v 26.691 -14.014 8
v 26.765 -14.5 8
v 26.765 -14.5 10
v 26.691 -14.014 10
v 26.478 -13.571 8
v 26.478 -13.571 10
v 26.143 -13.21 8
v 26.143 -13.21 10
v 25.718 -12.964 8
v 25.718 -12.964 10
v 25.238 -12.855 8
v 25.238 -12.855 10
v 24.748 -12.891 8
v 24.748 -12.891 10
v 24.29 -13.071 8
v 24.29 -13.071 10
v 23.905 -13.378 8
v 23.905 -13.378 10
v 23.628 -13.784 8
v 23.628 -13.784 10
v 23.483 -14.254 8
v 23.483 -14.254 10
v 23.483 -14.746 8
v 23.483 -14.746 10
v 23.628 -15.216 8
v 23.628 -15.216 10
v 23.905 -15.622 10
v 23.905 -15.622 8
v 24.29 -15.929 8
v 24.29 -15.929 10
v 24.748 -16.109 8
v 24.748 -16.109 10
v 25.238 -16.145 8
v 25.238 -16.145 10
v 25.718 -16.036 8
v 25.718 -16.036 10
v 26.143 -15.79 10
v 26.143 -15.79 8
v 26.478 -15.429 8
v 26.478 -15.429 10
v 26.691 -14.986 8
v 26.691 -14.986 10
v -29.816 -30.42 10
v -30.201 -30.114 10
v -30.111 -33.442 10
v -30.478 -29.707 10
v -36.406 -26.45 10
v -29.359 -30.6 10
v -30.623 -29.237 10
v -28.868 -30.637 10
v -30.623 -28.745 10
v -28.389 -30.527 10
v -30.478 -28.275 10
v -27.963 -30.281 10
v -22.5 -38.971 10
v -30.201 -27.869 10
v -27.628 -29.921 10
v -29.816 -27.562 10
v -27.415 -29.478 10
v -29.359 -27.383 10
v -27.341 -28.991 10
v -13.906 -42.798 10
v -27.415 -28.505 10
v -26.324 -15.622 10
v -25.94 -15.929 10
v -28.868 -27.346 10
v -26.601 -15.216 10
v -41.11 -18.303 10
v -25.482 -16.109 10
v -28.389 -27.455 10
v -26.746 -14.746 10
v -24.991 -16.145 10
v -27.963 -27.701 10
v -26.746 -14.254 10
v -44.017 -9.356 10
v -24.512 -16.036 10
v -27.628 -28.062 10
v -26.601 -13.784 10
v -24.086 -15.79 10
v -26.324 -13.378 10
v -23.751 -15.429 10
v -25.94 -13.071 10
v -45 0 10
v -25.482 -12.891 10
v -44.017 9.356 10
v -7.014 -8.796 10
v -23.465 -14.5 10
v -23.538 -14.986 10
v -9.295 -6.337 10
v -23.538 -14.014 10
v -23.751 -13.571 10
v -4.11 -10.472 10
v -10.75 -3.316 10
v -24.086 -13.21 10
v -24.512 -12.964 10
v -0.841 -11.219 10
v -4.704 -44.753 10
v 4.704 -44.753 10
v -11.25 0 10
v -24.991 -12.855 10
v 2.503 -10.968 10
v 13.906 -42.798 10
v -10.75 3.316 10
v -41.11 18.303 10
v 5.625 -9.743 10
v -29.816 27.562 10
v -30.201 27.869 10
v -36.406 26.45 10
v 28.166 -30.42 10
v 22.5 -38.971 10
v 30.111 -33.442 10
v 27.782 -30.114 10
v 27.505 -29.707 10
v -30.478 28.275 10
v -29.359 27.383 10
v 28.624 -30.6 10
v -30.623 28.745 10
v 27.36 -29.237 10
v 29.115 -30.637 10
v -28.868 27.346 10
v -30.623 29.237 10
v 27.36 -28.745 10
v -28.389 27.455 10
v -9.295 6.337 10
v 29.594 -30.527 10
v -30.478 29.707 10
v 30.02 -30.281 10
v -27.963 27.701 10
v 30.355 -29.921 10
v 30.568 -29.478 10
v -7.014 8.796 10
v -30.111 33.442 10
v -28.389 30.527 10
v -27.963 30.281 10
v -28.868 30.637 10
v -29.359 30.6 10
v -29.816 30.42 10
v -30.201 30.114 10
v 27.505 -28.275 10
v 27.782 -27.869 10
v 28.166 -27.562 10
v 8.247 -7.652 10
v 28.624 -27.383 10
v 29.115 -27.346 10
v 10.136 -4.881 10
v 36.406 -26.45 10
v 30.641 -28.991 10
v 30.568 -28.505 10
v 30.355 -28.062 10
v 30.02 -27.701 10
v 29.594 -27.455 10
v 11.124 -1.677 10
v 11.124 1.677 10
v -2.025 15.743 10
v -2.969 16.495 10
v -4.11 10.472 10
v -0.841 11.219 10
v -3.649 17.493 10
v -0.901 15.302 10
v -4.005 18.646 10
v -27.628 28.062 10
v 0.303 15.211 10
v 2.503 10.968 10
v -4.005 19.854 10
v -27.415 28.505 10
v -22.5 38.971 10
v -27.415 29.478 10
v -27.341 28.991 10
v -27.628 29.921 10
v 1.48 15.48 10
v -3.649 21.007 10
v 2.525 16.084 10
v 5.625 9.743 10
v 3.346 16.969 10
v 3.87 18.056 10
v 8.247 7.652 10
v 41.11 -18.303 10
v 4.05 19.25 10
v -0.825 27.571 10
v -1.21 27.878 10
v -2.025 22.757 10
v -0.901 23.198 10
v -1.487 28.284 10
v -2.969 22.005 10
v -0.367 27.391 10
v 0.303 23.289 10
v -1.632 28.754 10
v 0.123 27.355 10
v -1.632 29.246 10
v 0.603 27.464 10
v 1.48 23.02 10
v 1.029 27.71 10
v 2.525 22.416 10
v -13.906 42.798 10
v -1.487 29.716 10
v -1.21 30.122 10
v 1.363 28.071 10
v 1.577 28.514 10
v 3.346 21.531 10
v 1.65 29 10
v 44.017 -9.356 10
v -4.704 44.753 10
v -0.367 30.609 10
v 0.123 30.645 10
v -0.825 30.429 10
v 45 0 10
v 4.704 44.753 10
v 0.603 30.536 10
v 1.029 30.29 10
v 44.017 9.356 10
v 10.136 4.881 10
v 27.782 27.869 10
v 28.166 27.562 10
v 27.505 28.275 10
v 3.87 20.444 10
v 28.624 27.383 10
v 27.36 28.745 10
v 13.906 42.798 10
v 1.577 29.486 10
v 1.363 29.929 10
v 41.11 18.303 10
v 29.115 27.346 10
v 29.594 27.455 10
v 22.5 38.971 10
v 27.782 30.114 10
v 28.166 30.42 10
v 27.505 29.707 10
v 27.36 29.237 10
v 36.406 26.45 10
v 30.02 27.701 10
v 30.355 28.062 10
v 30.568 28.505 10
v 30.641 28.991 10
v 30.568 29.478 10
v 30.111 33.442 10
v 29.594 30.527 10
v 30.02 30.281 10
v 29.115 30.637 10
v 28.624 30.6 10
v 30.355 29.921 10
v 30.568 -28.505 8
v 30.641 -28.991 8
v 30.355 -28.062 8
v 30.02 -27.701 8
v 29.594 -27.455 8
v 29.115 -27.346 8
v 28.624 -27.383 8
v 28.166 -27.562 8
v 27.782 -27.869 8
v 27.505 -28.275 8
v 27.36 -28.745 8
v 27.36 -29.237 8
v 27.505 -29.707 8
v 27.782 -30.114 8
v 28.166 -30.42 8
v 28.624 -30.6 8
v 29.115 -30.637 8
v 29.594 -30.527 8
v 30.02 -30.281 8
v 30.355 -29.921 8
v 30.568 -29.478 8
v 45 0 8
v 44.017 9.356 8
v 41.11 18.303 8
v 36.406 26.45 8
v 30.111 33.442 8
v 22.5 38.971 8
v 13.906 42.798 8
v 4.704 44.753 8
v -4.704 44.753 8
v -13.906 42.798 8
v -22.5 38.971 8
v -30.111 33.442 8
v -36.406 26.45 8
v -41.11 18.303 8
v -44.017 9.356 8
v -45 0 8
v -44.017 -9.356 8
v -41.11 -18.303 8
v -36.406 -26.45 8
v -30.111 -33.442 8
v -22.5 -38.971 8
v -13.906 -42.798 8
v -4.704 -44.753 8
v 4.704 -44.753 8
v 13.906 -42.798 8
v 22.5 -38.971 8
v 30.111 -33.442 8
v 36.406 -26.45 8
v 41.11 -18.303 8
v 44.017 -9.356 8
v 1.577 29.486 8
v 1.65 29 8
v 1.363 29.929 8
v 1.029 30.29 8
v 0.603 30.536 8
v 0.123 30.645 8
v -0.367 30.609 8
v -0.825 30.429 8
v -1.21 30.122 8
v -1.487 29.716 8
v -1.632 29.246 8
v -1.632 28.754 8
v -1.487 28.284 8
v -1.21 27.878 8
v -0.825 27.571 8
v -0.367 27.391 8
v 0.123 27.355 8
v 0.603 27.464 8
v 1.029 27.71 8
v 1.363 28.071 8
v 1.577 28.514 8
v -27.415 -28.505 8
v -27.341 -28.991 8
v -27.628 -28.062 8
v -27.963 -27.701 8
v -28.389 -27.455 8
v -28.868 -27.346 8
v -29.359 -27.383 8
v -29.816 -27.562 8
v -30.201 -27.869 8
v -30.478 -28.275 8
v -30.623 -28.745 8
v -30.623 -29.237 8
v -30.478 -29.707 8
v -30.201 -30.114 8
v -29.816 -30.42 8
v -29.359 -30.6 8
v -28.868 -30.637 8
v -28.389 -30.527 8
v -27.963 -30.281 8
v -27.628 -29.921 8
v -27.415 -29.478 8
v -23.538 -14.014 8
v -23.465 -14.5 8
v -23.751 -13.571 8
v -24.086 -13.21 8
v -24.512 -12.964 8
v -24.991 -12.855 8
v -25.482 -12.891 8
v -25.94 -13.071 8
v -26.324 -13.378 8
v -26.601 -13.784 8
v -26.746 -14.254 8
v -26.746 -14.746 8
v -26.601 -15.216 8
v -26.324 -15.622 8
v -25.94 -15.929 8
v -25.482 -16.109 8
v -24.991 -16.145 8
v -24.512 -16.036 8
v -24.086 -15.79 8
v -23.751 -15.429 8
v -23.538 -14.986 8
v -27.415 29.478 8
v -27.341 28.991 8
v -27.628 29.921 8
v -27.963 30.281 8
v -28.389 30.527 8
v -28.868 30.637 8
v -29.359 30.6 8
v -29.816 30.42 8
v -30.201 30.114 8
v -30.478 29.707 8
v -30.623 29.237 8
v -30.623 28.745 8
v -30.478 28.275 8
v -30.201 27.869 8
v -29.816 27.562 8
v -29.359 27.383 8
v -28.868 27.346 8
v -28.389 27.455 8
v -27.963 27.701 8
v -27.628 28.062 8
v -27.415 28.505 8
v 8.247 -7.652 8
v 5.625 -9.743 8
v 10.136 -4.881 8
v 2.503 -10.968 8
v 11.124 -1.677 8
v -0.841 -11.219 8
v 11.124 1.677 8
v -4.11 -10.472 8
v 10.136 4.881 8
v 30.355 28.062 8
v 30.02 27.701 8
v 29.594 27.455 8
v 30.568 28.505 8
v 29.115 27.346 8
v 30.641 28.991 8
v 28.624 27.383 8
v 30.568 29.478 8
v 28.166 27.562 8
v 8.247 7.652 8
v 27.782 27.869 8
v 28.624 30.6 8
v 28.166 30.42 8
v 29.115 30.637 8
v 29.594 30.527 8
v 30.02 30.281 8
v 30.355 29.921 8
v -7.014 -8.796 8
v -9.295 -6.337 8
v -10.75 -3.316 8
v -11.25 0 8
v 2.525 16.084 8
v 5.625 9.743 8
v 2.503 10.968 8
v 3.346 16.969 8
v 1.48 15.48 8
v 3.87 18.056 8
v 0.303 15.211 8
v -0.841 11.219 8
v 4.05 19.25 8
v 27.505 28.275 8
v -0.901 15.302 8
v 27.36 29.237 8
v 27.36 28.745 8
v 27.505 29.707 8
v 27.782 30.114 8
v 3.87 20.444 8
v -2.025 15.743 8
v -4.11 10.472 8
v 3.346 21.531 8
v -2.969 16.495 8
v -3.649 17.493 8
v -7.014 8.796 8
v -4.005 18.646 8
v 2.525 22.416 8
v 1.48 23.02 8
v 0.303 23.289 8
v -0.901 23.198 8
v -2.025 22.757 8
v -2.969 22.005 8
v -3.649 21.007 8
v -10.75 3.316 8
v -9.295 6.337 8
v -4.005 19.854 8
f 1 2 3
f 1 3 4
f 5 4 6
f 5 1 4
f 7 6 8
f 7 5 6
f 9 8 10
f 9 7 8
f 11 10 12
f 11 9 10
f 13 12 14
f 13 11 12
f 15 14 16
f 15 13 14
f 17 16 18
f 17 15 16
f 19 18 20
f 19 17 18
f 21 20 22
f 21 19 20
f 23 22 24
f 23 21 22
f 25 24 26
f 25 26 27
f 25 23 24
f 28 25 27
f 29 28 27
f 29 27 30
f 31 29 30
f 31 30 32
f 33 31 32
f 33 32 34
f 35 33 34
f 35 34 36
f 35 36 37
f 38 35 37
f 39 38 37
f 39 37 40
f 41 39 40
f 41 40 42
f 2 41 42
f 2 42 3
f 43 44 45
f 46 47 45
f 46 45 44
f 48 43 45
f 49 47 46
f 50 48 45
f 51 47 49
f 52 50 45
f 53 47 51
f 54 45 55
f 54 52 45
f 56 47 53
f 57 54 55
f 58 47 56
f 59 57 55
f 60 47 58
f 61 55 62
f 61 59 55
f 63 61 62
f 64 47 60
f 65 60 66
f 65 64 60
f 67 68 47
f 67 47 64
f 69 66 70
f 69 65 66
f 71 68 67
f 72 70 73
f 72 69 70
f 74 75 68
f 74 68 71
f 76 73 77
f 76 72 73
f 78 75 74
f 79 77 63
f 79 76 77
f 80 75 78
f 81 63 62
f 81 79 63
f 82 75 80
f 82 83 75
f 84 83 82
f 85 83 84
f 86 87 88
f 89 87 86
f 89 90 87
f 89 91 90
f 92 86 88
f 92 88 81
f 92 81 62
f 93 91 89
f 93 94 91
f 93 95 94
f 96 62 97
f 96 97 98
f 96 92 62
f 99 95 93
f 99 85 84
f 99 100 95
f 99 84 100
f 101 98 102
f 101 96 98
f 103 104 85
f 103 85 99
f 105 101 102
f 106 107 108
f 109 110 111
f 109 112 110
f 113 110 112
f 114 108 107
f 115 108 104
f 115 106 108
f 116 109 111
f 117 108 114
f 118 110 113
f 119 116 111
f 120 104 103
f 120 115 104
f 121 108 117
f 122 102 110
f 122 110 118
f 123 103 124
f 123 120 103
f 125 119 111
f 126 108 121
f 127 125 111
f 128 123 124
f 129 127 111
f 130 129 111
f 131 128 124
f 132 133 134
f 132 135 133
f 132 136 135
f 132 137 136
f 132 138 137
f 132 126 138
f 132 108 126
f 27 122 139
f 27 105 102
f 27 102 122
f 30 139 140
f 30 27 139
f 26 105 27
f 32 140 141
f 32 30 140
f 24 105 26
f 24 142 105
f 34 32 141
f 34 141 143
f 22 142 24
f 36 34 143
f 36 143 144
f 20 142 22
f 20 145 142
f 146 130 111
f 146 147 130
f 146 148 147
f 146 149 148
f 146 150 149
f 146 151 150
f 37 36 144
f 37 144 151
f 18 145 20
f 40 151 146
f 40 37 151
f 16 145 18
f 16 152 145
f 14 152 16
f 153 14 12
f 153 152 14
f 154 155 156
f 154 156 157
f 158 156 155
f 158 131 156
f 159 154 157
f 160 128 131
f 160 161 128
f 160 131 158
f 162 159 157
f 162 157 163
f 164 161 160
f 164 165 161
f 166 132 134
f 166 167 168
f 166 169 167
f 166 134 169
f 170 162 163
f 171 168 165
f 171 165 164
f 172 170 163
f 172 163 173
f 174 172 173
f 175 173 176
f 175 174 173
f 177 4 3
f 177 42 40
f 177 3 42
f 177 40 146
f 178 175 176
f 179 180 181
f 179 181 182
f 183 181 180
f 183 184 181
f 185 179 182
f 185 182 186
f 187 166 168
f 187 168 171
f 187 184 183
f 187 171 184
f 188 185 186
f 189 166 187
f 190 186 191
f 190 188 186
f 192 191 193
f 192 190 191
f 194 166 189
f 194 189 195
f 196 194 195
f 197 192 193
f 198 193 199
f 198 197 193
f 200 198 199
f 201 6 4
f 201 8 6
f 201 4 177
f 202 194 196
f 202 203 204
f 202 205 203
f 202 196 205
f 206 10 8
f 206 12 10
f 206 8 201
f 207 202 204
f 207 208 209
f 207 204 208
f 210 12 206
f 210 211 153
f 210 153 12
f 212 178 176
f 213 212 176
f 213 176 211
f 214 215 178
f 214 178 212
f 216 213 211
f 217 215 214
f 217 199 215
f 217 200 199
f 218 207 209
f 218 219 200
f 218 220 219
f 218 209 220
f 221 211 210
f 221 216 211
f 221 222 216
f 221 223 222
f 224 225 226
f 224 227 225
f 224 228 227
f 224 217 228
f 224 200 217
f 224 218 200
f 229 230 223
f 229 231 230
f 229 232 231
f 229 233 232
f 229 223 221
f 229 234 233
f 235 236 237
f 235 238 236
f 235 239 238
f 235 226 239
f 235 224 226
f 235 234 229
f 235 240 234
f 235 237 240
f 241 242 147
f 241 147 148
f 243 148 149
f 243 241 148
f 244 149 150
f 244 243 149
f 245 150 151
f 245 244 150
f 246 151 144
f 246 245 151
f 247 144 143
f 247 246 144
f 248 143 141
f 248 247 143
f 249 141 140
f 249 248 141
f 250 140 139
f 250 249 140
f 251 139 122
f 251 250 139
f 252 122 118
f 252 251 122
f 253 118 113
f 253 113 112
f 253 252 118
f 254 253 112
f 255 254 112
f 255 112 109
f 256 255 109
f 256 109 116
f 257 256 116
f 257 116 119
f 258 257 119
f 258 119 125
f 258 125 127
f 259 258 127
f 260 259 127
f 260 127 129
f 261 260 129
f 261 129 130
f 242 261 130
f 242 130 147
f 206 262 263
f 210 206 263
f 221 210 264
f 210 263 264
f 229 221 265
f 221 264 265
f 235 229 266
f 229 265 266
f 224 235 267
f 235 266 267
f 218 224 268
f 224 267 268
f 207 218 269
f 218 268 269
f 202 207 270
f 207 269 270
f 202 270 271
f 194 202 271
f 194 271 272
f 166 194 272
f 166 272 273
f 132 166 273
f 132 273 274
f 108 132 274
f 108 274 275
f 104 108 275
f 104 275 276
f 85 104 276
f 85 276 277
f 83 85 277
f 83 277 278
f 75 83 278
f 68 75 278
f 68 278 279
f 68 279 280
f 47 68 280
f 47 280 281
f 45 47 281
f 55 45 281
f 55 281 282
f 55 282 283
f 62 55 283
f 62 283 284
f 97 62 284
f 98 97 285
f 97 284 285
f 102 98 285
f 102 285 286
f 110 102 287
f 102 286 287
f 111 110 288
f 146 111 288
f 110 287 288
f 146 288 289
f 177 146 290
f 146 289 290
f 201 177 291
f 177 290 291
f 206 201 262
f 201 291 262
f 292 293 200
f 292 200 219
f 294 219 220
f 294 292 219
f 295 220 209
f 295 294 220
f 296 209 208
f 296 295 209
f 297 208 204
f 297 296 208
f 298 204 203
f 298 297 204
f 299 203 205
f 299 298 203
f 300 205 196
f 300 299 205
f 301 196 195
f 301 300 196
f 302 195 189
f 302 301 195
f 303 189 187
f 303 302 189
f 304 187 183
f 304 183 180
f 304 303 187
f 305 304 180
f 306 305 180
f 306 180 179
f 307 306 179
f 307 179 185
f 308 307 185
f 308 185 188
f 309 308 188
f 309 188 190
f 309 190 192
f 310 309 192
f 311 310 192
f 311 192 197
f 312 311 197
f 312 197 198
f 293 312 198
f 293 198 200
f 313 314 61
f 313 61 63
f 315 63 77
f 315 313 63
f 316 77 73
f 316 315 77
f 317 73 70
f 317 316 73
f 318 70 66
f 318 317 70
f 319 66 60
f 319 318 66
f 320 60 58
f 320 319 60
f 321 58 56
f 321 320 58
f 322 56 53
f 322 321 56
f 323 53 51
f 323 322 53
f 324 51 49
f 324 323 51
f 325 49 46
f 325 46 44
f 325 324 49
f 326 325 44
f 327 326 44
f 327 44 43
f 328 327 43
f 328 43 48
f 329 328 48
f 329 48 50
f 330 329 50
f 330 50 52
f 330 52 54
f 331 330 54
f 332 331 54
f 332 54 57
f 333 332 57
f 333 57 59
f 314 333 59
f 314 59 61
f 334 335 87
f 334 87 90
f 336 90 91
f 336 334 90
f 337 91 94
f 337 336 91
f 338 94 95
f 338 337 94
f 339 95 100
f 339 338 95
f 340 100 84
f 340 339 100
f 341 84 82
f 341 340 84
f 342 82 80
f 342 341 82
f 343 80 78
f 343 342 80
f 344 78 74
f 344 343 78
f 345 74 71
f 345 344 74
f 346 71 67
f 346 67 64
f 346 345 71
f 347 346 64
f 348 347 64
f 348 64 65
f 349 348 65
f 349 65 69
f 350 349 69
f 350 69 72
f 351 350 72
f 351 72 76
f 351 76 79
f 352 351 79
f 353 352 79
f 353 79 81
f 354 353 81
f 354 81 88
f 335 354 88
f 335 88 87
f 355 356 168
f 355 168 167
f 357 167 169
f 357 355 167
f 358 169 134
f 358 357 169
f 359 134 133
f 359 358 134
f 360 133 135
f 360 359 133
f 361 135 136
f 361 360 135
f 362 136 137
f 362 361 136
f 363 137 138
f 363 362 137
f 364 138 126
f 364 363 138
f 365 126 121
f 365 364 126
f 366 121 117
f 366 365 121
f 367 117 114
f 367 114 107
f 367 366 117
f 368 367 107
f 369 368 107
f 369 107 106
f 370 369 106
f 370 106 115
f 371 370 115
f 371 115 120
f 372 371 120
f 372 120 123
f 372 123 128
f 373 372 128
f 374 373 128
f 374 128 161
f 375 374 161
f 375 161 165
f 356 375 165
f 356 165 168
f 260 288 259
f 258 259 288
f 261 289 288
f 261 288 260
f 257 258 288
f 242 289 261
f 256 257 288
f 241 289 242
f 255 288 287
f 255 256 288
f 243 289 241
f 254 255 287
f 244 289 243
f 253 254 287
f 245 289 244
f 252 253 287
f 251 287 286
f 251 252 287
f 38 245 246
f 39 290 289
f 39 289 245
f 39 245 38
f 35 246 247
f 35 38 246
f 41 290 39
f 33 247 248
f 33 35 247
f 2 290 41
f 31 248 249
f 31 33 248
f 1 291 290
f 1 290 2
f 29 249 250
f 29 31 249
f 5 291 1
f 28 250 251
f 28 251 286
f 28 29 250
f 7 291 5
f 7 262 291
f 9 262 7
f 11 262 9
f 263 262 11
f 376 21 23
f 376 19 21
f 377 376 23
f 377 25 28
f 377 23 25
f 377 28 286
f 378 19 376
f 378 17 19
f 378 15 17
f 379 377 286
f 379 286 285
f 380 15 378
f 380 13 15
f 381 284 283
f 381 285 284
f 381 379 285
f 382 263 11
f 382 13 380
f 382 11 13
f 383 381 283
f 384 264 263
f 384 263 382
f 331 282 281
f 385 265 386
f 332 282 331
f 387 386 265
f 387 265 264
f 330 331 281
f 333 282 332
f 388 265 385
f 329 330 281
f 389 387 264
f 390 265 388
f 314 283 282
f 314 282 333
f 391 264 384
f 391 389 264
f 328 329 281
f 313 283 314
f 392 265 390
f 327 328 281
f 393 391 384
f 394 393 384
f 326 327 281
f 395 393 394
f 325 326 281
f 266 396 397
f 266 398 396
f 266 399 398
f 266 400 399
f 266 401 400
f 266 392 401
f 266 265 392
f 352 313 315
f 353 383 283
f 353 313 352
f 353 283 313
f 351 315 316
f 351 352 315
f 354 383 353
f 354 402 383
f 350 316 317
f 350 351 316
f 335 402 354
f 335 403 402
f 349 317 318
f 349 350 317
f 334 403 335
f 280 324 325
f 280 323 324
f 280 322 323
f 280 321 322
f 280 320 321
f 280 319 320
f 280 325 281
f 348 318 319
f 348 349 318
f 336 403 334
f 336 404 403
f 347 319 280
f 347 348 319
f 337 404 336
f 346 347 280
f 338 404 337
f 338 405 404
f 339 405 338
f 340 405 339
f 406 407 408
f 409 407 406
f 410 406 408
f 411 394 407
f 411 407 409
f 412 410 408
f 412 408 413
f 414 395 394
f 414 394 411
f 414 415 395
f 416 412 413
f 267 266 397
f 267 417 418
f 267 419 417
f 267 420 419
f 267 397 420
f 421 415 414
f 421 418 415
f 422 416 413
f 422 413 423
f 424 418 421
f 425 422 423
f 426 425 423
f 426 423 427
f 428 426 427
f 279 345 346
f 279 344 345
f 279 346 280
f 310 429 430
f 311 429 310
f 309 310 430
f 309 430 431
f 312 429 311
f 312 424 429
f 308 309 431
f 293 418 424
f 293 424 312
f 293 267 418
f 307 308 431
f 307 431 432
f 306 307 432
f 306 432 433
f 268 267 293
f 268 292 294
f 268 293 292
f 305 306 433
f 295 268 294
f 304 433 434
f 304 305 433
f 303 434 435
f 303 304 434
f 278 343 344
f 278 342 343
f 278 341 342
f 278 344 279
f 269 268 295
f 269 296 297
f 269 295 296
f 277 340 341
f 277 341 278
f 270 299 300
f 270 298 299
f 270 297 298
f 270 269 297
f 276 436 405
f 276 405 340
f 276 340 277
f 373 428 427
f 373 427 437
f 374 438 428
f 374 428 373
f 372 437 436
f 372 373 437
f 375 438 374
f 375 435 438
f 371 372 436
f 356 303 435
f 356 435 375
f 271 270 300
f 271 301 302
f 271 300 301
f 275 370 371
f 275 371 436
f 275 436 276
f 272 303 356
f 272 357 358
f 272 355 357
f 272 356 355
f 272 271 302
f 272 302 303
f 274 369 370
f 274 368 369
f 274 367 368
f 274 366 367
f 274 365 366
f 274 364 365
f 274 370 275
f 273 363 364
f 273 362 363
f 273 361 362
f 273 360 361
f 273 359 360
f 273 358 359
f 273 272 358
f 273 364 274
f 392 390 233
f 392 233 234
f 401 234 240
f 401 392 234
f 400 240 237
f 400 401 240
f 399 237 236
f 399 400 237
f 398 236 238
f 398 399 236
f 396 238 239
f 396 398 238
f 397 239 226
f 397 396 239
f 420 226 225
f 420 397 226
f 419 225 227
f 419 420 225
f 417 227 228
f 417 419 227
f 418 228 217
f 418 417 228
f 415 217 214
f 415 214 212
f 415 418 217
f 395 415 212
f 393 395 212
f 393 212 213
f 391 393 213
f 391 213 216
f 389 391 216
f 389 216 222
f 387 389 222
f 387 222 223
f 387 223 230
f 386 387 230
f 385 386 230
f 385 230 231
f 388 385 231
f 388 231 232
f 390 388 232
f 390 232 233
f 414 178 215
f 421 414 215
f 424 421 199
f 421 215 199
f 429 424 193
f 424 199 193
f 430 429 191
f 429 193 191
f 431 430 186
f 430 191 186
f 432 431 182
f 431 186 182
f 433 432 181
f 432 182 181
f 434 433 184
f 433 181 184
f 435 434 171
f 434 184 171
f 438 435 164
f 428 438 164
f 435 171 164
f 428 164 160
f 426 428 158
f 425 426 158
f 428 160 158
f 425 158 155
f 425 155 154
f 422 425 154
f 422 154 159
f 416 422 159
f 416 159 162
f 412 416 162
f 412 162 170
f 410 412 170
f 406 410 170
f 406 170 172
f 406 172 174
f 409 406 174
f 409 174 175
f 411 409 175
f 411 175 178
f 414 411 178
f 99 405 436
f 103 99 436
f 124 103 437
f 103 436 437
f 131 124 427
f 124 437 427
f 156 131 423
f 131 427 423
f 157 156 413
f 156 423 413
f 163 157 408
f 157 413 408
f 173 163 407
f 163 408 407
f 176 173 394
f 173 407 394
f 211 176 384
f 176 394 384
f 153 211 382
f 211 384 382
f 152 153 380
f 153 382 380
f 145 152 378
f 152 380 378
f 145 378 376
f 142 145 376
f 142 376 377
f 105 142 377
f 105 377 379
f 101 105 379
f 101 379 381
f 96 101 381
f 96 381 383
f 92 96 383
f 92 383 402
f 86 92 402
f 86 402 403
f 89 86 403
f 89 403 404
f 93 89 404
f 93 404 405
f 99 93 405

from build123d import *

# Parameters (mm, degrees)
SKETCH_1_R           = 45
SKETCH_1_R_2         = 1.65
SKETCH_1_R_3         = 10.15
EXTRUDE_1_DEPTH      = 10
SKETCH_2_R           = 4.05
CUT_EXTRUDE_1_DEPTH  = 12
SKETCH_5_R           = 34.5
CUT_EXTRUDE_4_DEPTH  = 3
CUT_EXTRUDE_6_DEPTH  = 3
SKETCH_10_R          = 45
CUT_EXTRUDE_9_DEPTH  = 8
SKETCH_11_R          = 11.25
CUT_EXTRUDE_10_DEPTH = 10


with BuildPart() as part:
    # 草图1 → 凸台-拉伸1 (new body)
    with BuildSketch(Plane.XY):
        Circle(SKETCH_1_R)
        with Locations((-28.991378029, 28.991378029)):
            Circle(SKETCH_1_R_2, mode=Mode.SUBTRACT)
        with Locations((28.991378029, 28.991378029)):
            Circle(SKETCH_1_R_2, mode=Mode.SUBTRACT)
        with Locations((-28.991378029, -28.991378029)):
            Circle(SKETCH_1_R_2, mode=Mode.SUBTRACT)
        with Locations((28.991378029, -28.991378029)):
            Circle(SKETCH_1_R_2, mode=Mode.SUBTRACT)
        with Locations((0, 29)):
            Circle(SKETCH_1_R_2, mode=Mode.SUBTRACT)
        with Locations((-25.11473671, -14.5)):
            Circle(SKETCH_1_R_2, mode=Mode.SUBTRACT)
        with Locations((25.11473671, -14.5)):
            Circle(SKETCH_1_R_2, mode=Mode.SUBTRACT)
        Circle(SKETCH_1_R_3, mode=Mode.SUBTRACT)
    extrude(amount=EXTRUDE_1_DEPTH)

    # 草图2 → 切除-拉伸1 (cut)
    with BuildSketch(Plane.XY.offset(10)):
        with Locations((0, 19.25)):
            Circle(SKETCH_2_R)
    extrude(amount=-CUT_EXTRUDE_1_DEPTH, mode=Mode.SUBTRACT)

    # 草图5 → 切除-拉伸4 (cut)
    with BuildSketch(Plane(origin=(0, 0, 0), x_dir=(-1, 0, 0), z_dir=(0, 0, -1))):
        Circle(SKETCH_5_R)
    extrude(amount=-CUT_EXTRUDE_4_DEPTH, mode=Mode.SUBTRACT)

    # 草图7 → 切除-拉伸6 (cut)
    with BuildSketch(Plane(origin=(0, 0, 3), x_dir=(-1, 0, 0), z_dir=(0, 0, -1))):
        Polygon((0, 0), (-25.071115349, -53.76518037), (25.215961405, -54.075803739), align=None)
    extrude(amount=CUT_EXTRUDE_6_DEPTH, mode=Mode.SUBTRACT)

    # 草图10 → 切除-拉伸9 (cut)
    with BuildSketch(Plane(origin=(0, 0, 0), x_dir=(-1, 0, 0), z_dir=(0, 0, -1))):
        Circle(SKETCH_10_R)
    extrude(amount=-CUT_EXTRUDE_9_DEPTH, mode=Mode.SUBTRACT)

    # 草图11 → 切除-拉伸10 (cut)
    with BuildSketch(Plane(origin=(0, 0, 8), x_dir=(-1, 0, 0), z_dir=(0, 0, -1))):
        Circle(SKETCH_11_R)
    extrude(amount=-CUT_EXTRUDE_10_DEPTH, mode=Mode.SUBTRACT)


solid = part.part
